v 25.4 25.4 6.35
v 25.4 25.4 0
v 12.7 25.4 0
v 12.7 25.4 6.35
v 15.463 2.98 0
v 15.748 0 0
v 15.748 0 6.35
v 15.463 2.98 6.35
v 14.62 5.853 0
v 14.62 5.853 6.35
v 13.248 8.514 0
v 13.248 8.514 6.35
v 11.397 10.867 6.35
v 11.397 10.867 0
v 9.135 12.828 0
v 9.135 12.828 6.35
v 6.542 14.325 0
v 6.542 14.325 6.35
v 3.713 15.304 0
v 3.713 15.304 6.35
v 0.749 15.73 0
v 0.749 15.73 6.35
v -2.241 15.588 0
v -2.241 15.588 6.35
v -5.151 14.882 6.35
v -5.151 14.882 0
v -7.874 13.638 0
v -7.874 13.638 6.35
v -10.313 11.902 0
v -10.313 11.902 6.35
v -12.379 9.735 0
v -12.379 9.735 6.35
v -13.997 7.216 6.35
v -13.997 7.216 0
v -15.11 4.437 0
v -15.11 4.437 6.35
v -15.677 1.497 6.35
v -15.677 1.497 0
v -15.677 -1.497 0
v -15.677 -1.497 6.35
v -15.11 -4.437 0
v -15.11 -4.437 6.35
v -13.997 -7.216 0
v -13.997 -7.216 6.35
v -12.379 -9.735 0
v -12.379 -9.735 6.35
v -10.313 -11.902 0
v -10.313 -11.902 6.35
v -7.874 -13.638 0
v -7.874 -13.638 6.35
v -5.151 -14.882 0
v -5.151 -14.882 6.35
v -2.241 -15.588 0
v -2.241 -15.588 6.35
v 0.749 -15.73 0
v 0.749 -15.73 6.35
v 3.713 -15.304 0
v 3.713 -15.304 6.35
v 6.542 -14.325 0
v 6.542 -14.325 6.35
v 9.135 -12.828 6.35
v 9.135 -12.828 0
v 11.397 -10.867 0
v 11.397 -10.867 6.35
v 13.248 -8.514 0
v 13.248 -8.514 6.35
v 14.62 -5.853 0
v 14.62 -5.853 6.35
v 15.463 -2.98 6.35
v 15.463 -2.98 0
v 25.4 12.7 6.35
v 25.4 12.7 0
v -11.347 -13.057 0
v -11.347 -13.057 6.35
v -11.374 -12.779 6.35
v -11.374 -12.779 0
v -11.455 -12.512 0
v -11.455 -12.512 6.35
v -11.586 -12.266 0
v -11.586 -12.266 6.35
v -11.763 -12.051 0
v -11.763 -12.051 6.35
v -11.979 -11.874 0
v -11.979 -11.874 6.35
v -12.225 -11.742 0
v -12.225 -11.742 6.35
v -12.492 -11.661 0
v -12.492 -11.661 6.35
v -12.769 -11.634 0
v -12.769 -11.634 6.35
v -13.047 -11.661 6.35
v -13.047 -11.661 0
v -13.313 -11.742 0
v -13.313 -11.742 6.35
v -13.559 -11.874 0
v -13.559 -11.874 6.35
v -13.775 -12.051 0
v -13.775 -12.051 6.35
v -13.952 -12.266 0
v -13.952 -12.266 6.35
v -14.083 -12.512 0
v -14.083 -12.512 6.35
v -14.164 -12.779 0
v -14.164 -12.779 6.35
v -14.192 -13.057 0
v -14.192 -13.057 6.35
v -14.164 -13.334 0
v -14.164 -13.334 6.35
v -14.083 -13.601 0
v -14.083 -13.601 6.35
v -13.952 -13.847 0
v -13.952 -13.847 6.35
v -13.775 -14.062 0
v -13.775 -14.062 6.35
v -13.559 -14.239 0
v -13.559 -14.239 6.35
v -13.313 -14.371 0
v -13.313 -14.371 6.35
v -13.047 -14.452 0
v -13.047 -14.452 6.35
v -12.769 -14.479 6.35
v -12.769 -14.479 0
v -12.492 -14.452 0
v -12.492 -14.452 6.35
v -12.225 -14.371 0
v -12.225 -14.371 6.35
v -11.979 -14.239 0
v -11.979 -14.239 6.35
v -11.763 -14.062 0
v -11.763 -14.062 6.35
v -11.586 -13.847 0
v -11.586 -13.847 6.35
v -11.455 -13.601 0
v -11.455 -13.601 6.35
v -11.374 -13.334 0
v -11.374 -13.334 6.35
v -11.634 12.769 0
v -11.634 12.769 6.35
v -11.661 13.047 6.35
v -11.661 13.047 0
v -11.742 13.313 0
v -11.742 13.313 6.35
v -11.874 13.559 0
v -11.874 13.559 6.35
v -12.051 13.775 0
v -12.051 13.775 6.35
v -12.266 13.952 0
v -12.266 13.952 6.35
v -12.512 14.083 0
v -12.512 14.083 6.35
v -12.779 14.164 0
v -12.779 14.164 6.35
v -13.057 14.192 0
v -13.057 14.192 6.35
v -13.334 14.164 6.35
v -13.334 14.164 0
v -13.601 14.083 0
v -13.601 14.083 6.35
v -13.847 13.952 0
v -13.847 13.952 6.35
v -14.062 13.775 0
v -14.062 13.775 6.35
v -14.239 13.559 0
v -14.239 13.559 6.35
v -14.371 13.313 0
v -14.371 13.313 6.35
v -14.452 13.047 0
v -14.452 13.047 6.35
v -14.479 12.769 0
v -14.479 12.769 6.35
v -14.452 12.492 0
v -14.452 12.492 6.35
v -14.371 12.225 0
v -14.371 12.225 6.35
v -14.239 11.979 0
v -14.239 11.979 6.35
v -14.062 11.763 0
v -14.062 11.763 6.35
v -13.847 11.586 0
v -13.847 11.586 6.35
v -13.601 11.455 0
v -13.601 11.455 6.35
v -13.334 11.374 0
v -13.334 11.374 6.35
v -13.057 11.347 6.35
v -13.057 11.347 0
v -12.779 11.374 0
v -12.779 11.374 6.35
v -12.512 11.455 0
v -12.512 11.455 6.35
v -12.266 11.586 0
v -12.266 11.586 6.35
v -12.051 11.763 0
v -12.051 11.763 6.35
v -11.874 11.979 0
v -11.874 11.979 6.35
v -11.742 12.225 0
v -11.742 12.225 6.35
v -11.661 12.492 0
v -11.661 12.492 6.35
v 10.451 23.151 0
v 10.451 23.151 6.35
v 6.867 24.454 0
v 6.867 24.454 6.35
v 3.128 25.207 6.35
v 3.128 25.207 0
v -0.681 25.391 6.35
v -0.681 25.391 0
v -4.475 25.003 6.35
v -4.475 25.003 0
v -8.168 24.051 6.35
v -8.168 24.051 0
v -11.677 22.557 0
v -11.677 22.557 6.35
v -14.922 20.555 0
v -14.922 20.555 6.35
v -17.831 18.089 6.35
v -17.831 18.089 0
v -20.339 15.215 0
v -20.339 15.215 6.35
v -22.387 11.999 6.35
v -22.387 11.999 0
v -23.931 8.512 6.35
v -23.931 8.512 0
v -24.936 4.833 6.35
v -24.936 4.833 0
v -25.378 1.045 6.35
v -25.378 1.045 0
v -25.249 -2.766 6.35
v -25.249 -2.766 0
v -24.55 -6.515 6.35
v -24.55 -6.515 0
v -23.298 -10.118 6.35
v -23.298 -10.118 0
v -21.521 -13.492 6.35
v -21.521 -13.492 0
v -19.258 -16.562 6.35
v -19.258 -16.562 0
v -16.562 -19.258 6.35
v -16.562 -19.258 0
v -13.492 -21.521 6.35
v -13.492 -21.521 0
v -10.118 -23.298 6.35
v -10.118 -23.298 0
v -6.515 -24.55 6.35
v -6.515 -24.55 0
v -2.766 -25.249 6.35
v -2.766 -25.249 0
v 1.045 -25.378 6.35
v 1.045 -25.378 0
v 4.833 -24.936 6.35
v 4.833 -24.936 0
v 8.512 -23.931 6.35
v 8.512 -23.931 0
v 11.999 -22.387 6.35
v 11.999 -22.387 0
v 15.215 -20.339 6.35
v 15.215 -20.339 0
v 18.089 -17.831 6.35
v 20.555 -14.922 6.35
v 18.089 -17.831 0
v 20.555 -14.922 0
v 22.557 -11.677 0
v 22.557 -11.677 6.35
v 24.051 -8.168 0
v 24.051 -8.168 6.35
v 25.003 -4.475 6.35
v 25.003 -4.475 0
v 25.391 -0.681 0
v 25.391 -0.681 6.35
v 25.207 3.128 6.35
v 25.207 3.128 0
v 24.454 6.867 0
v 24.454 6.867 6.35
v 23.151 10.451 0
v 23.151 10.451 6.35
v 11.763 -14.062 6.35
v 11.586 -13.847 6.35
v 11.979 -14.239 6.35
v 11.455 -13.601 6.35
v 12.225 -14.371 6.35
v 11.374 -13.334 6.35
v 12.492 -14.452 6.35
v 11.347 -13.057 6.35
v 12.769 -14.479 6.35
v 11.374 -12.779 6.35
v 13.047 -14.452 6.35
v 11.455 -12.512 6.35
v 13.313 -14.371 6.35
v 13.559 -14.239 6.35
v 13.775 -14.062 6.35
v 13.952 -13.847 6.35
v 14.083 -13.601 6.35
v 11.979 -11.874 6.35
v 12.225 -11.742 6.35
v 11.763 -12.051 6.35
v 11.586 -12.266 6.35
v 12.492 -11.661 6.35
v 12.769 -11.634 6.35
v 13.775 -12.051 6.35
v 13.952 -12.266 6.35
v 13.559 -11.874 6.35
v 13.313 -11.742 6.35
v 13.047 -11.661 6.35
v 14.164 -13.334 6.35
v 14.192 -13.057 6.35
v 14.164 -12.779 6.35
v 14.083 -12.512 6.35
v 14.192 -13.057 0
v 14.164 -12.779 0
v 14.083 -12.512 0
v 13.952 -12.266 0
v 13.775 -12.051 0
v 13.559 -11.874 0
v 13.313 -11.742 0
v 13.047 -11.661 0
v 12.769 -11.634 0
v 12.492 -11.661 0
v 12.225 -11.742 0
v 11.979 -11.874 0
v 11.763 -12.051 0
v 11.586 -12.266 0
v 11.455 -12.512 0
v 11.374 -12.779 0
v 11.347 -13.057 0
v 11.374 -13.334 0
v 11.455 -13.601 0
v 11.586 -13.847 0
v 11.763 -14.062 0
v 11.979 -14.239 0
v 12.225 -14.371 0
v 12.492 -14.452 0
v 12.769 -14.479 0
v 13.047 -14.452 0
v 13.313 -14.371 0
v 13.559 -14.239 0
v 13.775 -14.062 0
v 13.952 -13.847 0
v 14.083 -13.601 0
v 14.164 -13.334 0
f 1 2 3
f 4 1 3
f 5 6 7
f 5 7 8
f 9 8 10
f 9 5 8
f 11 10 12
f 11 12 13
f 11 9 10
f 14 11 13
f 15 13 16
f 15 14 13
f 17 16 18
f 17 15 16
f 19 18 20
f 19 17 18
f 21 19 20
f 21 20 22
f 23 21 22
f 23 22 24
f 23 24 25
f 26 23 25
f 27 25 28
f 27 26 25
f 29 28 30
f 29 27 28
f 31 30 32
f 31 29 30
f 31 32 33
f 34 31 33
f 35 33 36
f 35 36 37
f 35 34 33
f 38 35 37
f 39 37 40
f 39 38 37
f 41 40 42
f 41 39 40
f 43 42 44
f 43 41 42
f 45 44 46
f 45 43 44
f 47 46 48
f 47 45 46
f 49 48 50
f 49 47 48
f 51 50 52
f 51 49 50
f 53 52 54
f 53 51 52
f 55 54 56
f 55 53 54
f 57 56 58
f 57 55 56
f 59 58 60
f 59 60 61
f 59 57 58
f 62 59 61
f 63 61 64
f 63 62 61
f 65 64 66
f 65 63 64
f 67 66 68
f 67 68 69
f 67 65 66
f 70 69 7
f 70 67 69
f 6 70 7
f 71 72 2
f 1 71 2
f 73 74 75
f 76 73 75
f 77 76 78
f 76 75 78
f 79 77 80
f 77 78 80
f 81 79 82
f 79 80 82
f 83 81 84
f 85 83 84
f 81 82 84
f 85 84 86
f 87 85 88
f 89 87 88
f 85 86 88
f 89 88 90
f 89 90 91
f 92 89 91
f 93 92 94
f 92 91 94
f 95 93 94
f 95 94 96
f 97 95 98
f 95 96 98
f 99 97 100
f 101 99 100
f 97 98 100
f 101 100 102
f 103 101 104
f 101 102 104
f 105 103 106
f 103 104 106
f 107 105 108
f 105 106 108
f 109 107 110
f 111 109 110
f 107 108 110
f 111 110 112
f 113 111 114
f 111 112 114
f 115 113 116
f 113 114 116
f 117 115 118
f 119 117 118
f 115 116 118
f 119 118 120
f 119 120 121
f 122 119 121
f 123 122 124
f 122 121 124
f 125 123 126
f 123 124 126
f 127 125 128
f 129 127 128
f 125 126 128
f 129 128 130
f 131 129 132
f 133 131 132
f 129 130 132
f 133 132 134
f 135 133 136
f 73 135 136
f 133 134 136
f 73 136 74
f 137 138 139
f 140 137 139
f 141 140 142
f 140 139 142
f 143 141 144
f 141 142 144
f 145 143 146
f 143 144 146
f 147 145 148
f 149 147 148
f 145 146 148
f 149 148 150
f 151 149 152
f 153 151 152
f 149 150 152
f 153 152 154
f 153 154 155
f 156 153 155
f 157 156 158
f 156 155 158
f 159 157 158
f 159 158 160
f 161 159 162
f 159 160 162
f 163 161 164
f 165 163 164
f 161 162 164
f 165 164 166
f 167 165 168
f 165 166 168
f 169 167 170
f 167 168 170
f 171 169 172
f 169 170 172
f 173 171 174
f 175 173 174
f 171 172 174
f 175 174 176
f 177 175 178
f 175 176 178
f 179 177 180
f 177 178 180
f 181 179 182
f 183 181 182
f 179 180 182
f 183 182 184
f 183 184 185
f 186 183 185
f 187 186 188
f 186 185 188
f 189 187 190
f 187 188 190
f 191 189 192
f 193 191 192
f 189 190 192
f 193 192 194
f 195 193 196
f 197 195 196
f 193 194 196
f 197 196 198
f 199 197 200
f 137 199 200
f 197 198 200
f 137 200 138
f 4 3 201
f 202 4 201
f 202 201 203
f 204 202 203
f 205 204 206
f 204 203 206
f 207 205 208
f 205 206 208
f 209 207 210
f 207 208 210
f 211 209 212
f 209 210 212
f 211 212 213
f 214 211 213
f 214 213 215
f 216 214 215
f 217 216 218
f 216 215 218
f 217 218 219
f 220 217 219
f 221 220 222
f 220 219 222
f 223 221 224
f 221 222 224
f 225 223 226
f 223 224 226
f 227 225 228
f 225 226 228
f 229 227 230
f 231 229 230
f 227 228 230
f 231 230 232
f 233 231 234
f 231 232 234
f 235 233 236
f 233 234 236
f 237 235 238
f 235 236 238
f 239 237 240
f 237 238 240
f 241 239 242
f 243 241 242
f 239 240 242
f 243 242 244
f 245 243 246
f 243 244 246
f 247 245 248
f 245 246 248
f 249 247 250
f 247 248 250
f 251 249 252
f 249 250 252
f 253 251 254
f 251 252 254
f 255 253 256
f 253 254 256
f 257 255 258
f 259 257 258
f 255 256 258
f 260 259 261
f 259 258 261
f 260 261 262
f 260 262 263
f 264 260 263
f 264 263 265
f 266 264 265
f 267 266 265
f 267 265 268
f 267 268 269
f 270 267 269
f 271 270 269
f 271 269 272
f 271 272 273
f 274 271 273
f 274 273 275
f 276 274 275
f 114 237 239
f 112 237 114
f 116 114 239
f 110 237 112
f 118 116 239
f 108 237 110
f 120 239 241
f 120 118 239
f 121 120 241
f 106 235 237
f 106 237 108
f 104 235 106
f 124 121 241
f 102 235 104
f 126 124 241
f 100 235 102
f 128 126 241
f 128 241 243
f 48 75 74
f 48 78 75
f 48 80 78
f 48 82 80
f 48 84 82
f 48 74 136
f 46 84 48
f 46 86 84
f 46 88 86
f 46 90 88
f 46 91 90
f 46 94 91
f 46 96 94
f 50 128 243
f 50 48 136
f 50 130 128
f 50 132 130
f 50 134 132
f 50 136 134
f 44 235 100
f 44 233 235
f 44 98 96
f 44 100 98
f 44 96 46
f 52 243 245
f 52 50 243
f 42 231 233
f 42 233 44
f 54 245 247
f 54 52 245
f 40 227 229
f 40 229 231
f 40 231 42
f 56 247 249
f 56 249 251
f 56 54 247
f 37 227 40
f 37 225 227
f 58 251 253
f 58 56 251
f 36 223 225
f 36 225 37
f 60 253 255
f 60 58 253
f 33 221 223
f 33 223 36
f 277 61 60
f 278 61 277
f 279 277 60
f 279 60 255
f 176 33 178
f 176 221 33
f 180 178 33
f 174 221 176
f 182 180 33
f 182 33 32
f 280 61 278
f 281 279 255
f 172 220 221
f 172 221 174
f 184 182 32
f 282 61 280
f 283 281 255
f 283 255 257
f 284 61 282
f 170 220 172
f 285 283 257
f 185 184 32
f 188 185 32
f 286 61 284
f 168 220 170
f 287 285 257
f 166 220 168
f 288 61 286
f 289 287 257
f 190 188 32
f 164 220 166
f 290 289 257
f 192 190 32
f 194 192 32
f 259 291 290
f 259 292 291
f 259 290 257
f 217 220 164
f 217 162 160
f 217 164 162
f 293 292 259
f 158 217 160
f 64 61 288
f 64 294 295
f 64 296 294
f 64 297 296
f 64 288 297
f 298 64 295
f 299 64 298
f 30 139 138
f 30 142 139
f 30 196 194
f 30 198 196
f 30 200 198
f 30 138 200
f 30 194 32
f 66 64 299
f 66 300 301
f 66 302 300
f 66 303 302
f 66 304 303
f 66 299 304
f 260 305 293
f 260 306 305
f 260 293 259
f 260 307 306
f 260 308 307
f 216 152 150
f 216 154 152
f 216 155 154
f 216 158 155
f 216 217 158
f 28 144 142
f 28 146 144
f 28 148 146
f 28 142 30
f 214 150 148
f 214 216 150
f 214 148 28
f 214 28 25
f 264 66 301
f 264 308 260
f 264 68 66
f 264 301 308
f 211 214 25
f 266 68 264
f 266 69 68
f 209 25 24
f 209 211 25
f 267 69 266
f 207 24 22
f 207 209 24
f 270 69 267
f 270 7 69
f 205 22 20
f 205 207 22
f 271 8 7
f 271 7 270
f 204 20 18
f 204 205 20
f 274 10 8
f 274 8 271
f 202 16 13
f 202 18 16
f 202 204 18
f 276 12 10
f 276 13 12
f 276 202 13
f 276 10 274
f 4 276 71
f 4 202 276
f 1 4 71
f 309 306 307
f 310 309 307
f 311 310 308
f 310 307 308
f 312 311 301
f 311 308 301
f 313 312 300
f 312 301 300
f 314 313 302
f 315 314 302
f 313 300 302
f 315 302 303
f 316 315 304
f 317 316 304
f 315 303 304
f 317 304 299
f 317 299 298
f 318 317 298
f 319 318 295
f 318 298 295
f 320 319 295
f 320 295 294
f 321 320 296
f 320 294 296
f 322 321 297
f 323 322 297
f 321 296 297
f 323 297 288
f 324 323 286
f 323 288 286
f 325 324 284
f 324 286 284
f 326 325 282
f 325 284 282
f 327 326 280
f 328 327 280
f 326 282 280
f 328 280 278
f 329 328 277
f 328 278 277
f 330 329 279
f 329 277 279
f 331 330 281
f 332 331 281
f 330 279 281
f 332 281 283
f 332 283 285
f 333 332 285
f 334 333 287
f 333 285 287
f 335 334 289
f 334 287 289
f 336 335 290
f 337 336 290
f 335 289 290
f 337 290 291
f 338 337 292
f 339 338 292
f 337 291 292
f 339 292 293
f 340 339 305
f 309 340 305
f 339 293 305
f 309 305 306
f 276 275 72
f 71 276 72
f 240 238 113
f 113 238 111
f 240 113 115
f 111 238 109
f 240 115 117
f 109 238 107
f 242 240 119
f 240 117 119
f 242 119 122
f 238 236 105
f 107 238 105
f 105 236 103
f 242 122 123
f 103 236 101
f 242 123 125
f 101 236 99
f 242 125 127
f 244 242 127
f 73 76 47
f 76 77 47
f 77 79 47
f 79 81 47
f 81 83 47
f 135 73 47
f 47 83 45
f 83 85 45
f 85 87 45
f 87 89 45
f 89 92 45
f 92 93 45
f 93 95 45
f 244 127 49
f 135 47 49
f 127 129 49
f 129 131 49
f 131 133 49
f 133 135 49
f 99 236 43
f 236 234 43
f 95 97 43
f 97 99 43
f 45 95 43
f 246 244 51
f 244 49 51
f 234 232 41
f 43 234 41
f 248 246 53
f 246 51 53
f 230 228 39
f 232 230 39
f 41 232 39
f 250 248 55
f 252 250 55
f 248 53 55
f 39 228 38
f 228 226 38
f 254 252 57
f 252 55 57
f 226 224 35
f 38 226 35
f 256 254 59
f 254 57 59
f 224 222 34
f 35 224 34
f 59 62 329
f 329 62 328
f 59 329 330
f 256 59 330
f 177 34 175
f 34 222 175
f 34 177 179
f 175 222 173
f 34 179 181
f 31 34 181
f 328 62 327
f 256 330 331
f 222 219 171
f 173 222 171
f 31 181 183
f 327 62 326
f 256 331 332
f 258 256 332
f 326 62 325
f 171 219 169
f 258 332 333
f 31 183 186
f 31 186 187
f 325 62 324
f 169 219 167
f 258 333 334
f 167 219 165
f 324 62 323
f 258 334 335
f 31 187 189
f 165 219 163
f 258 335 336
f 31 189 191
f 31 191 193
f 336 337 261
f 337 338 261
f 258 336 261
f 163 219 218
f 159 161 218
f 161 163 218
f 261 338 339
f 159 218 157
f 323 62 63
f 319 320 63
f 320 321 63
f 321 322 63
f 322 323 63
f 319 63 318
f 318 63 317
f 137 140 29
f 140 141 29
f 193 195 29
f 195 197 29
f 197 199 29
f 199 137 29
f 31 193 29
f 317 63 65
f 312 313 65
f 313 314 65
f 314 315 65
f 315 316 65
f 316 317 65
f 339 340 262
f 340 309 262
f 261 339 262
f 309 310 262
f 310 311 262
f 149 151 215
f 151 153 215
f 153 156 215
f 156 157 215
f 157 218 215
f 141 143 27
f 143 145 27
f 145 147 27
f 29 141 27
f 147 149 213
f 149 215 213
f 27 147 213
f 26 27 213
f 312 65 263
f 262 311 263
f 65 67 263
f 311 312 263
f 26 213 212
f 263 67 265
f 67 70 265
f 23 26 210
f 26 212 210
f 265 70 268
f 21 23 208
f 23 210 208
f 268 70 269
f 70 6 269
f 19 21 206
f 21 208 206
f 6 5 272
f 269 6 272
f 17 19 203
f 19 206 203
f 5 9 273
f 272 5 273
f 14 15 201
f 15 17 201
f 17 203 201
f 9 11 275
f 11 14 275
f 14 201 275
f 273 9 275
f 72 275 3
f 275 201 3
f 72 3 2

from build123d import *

# Parameters (mm, degrees)
SKETCH1_R           = 15.748
BOSS_EXTRUDE1_DEPTH = 6.35
SKETCH2_R           = 1.4224
CUT_EXTRUDE2_DEPTH  = 6.35


with BuildPart() as part:
    # Sketch1 → Boss-Extrude1 (new body)
    with BuildSketch(Plane.XY):
        with BuildLine():
            Line((23.150520825, 10.450520825), (25.4, 12.7))
            Line((25.4, 12.7), (25.4, 25.4))
            Line((25.4, 25.4), (12.7, 25.4))
            Line((12.7, 25.4), (10.450520825, 23.150520825))
            ThreePointArc((10.450520825, 23.150520825), (-17.960512242, -17.960512242), (23.150520825, 10.450520825))
        make_face()
        Circle(SKETCH1_R, mode=Mode.SUBTRACT)
    extrude(amount=BOSS_EXTRUDE1_DEPTH)

    # Sketch2 → Cut-Extrude2 (cut)
    with BuildSketch(Plane.XY.offset(6.35)):
        with Locations((12.76910233, -13.056515019)):
            Circle(SKETCH2_R)
        with Locations((-13.056515019, 12.76910233)):
            Circle(SKETCH2_R)
        with Locations((-12.76910233, -13.056515019)):
            Circle(SKETCH2_R)
    extrude(amount=-CUT_EXTRUDE2_DEPTH, mode=Mode.SUBTRACT)


solid = part.part
